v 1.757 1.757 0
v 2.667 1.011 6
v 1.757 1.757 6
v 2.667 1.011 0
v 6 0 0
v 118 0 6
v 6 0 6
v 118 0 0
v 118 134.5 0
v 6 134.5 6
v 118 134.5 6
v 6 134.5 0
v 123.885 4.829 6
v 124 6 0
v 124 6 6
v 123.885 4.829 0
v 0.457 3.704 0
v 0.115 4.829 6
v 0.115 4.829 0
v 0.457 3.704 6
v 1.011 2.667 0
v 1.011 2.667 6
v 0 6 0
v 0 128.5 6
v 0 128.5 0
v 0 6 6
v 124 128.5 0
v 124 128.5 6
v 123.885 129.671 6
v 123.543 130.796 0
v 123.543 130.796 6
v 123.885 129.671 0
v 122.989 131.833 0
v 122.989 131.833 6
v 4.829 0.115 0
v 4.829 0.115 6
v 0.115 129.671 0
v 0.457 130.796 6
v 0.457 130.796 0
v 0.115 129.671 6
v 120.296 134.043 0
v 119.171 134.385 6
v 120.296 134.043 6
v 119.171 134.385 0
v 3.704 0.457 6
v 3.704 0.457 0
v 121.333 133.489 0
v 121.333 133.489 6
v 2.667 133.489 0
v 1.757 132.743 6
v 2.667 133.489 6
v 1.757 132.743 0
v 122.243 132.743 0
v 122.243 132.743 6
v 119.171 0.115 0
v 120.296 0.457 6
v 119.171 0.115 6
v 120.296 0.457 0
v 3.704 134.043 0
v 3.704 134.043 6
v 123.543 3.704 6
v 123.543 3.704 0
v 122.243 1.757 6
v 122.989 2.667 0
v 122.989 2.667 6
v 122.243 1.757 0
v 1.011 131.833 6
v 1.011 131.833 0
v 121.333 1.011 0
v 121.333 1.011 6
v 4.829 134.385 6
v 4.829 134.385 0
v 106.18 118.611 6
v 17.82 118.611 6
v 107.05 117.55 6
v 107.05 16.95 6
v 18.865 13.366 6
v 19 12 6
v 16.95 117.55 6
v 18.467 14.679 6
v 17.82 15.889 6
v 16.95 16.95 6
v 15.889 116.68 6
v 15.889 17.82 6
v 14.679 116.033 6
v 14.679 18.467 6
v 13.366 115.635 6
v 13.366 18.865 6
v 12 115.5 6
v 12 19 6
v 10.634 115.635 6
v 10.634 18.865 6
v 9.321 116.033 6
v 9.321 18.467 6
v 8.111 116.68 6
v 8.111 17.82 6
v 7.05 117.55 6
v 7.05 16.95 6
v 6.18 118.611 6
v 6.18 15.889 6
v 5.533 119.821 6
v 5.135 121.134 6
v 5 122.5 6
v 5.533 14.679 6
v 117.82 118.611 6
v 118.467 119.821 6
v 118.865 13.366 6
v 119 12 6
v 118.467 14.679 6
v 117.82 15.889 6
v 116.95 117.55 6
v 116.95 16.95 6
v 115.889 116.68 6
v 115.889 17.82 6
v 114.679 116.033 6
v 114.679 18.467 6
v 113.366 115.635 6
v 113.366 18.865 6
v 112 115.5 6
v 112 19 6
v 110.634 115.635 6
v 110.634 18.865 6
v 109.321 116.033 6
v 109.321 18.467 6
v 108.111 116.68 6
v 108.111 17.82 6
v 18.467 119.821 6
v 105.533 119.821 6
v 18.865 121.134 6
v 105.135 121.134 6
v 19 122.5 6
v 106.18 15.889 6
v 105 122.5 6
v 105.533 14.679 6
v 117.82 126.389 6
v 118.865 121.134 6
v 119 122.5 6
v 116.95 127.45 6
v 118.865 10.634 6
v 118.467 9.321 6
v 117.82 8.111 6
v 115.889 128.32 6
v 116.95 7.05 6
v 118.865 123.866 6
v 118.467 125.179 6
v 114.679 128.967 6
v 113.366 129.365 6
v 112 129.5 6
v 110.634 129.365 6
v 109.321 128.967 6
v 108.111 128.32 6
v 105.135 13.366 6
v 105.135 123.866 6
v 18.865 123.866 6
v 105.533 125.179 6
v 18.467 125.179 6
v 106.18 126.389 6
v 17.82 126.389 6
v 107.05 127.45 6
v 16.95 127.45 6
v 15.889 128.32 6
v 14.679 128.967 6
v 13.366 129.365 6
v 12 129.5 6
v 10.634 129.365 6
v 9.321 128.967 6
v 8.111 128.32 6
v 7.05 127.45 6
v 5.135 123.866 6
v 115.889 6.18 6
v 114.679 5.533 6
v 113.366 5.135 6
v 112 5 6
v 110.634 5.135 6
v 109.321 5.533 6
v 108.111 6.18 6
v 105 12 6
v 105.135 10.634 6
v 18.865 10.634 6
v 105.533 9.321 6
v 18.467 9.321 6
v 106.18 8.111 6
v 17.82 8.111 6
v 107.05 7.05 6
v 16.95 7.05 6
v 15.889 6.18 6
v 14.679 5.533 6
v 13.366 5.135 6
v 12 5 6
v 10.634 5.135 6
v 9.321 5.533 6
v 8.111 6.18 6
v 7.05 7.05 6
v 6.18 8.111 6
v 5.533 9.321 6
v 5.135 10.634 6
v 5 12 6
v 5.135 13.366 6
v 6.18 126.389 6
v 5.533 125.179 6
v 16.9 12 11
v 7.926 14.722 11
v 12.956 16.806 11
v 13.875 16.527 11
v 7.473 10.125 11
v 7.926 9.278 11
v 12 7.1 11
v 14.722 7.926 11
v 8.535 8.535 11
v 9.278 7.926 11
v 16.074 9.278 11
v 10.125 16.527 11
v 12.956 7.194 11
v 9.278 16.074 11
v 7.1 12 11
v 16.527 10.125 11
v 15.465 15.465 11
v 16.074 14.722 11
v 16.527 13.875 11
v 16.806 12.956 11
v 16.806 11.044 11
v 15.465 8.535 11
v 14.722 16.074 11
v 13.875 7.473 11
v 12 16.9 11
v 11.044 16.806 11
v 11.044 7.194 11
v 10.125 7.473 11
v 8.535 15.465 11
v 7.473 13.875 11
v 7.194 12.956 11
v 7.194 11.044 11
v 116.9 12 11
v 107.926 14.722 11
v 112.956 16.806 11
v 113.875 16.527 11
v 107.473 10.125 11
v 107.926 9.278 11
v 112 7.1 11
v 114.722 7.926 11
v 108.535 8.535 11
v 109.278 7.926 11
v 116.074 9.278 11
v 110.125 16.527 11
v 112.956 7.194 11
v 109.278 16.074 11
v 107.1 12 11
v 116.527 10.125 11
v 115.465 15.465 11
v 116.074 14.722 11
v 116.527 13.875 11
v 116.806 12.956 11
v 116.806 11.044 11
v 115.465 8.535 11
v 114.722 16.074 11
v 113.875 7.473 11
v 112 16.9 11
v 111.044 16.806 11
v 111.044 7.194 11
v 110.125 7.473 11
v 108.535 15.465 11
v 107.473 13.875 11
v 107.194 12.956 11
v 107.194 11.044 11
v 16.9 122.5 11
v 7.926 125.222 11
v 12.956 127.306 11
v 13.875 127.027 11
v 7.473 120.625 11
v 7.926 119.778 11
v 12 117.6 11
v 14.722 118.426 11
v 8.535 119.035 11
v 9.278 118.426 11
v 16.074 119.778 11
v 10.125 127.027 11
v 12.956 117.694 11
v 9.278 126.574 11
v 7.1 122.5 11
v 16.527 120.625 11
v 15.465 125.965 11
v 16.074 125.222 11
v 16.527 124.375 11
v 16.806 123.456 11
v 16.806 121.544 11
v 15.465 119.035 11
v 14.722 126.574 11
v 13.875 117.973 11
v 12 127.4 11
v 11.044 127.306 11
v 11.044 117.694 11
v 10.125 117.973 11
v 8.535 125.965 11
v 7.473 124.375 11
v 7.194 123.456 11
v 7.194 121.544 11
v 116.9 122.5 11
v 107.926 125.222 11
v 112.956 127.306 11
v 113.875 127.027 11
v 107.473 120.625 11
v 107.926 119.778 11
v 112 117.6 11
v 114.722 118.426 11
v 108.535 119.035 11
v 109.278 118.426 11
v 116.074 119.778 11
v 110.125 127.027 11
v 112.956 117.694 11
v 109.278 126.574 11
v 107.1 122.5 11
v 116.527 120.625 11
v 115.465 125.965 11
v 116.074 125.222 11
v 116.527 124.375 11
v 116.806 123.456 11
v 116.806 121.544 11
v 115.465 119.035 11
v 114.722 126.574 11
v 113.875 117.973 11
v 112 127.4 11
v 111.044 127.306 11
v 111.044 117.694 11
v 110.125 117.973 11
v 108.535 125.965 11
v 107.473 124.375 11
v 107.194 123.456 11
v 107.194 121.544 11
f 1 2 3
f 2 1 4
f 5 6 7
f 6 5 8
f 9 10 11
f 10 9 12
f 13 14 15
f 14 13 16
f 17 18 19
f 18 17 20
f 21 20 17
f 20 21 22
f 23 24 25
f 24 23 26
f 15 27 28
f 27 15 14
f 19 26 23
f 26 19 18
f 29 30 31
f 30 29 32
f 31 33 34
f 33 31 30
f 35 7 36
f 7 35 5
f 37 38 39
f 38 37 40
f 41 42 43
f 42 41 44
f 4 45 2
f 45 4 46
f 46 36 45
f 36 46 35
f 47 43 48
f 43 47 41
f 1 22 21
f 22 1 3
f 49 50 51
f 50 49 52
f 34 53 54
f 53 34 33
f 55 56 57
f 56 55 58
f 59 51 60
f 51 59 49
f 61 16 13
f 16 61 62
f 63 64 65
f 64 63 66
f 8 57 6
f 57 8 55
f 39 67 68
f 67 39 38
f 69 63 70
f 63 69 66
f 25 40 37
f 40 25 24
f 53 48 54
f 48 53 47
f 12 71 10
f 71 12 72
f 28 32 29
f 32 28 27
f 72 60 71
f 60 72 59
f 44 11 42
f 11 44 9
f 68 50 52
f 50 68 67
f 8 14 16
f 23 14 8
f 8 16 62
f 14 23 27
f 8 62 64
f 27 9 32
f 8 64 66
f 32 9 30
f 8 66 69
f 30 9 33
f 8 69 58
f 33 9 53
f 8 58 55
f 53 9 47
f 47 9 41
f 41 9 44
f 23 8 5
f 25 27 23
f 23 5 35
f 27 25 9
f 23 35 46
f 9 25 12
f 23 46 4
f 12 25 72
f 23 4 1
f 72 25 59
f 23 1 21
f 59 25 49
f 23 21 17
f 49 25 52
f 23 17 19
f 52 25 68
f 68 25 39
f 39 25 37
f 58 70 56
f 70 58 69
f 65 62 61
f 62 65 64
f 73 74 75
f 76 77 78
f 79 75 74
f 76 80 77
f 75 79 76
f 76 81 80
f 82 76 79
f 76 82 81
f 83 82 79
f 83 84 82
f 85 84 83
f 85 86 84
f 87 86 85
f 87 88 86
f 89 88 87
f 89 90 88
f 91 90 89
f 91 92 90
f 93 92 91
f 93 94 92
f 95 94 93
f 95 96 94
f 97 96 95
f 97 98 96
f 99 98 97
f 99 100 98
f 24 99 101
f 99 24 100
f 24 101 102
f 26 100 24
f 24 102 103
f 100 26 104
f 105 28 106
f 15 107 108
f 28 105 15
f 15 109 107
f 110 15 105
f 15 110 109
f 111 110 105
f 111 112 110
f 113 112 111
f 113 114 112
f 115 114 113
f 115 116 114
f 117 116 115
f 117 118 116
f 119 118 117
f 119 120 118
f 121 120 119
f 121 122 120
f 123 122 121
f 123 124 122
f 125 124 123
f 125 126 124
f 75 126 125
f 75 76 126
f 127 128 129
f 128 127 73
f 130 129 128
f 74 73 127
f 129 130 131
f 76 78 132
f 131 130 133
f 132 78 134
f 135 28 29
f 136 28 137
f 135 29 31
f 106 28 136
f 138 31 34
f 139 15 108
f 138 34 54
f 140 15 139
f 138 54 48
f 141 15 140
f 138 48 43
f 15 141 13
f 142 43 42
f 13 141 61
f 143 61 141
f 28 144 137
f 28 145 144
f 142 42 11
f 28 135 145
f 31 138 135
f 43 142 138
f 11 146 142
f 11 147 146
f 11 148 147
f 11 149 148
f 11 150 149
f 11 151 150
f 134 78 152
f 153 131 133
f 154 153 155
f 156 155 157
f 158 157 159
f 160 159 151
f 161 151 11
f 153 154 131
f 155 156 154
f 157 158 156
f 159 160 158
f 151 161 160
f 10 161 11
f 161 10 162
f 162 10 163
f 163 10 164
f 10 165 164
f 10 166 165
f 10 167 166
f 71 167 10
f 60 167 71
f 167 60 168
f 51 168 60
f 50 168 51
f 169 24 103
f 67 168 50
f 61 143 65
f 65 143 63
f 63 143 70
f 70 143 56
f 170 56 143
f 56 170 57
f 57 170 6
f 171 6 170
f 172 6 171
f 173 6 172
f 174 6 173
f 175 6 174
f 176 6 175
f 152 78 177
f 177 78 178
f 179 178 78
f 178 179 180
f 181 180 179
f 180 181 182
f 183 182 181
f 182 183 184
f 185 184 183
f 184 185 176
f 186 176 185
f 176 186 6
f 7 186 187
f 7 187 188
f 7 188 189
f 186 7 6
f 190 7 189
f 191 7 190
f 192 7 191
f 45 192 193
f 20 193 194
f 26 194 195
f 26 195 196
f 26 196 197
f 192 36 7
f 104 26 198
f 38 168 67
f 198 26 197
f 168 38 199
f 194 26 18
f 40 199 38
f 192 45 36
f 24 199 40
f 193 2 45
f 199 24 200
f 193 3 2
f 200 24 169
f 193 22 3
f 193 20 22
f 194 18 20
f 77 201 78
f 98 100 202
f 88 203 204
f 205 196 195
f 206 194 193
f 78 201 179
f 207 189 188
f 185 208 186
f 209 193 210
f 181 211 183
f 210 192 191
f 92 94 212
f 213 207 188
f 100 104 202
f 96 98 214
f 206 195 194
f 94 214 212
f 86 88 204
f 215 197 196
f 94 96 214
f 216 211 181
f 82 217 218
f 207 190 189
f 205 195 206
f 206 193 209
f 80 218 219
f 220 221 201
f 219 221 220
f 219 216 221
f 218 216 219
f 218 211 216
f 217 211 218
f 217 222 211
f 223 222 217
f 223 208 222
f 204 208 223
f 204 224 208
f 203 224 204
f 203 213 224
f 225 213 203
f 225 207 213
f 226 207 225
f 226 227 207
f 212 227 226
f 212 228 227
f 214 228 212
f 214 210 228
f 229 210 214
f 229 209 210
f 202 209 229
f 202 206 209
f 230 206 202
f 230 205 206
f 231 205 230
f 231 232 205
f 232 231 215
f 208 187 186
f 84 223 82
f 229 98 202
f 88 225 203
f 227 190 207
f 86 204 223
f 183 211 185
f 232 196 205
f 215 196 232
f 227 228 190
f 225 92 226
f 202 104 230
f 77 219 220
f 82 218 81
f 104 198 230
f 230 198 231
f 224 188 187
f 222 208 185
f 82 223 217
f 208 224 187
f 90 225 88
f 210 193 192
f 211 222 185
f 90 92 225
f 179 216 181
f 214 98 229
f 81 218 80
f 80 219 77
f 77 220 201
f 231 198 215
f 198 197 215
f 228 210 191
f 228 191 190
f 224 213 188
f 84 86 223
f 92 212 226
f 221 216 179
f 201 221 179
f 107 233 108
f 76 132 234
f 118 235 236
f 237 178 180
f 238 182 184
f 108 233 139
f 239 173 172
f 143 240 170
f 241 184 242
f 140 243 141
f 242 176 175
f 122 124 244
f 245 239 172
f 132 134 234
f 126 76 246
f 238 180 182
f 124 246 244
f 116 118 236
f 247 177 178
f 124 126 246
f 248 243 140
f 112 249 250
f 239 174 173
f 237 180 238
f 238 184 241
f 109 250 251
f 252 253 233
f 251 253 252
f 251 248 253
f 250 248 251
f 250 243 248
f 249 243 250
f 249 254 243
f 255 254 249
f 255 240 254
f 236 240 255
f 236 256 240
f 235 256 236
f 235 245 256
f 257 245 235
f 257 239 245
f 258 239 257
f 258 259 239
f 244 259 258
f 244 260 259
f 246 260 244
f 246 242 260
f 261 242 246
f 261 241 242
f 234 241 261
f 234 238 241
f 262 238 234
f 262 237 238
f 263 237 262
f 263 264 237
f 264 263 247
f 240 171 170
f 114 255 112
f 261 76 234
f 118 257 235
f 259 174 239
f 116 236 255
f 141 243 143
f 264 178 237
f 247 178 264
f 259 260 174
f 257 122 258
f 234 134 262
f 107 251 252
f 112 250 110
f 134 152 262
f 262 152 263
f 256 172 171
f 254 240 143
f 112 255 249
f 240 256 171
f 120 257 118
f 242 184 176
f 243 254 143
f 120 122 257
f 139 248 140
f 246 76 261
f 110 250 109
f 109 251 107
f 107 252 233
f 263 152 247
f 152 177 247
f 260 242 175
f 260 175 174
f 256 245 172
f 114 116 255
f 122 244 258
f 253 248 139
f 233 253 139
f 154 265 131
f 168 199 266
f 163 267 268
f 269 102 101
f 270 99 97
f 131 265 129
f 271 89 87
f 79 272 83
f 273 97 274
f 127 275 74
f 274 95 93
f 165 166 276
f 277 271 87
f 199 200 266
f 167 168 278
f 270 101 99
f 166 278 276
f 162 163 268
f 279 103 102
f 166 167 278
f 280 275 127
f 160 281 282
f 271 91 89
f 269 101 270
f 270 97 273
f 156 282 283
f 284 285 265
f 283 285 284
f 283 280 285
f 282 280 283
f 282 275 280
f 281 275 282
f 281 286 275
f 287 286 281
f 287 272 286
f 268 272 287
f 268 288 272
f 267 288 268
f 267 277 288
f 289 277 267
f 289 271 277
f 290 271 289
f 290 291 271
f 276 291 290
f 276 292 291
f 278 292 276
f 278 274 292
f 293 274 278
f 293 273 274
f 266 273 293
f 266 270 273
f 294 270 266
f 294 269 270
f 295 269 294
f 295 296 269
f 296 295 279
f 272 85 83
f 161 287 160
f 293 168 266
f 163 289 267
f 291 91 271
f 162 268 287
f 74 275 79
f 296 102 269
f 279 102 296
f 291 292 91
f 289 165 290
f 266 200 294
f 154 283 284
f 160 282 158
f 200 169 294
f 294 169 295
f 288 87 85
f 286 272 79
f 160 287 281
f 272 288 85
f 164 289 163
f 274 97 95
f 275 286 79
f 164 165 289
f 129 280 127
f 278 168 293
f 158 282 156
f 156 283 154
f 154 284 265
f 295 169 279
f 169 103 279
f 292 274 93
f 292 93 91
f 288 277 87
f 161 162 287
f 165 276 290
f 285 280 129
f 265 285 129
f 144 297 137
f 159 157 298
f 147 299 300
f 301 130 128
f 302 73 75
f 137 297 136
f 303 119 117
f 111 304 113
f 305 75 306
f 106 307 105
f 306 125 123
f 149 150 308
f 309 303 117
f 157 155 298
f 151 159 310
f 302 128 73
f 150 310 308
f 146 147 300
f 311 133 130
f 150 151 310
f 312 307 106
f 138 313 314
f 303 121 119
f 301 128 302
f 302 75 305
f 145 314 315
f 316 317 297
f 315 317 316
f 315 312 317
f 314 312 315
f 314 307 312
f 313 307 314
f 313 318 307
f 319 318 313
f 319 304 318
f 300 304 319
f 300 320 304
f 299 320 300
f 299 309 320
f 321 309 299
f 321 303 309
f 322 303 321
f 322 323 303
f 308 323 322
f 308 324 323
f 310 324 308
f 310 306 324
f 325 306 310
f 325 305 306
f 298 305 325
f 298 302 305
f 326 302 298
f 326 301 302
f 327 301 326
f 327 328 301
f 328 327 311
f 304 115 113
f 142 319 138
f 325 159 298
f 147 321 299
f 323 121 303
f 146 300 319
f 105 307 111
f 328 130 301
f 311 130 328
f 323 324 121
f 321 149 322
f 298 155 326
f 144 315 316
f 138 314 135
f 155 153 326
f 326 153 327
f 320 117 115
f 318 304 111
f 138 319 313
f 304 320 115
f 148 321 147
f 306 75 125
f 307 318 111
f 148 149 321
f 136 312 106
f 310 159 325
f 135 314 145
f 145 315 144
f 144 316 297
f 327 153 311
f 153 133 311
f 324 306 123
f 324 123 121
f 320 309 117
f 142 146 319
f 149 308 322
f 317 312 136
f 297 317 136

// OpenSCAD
// Sonos Era 100 Isolation Pad
// Material: PETG recommended
// Speaker footprint: 120mm W x 130.5mm D
// Pad adds 2mm margin on each side for easy placement

// --- Parameters ---
pad_width   = 124;   // mm (120 + 2mm margin each side)
pad_depth   = 134.5; // mm (130.5 + 2mm margin each side)
pad_height  = 6;     // mm base thickness

// Nub (isolation foot) parameters
nub_diameter  = 14;  // mm
nub_height    = 5;   // mm
nub_inset     = 12;  // mm from each corner (center of nub)
nub_fn        = 32;  // smoothness

// Corner radius for aesthetics
corner_radius = 6;   // mm

// --- Main Body (rounded rectangle base) ---
module rounded_rect(w, d, h, r) {
    hull() {
        translate([ r,  r, 0]) cylinder(r=r, h=h, $fn=nub_fn);
        translate([w-r, r, 0]) cylinder(r=r, h=h, $fn=nub_fn);
        translate([ r, d-r, 0]) cylinder(r=r, h=h, $fn=nub_fn);
        translate([w-r, d-r, 0]) cylinder(r=r, h=h, $fn=nub_fn);
    }
}

// --- Nub (vibration isolation foot) ---
// Tapered cylinder for better grip and isolation
module nub() {
    cylinder(d1=nub_diameter, d2=nub_diameter*0.7, h=nub_height, $fn=nub_fn);
}

// --- Assemble ---
union() {
    // Base pad
    rounded_rect(pad_width, pad_depth, pad_height, corner_radius);

    // Four corner nubs on the bottom (printed upside down, so they appear on top in model)
    // When printing: orient so nubs face DOWN onto the shelf surface
    translate([nub_inset,            nub_inset,            pad_height]) nub();
    translate([pad_width - nub_inset, nub_inset,            pad_height]) nub();
    translate([nub_inset,            pad_depth - nub_inset, pad_height]) nub();
    translate([pad_width - nub_inset, pad_depth - nub_inset, pad_height]) nub();
}

// --- PRINT NOTES (read before slicing) ---
// 1. Print UPSIDE DOWN (nubs facing the build plate) so nubs face DOWN in use
// 2. PETG settings: 240°C nozzle, 70-80°C bed, 3 walls, 20-30% infill
// 3. No supports needed
// 4. Print 2 copies — one per speaker
// 5. The nubs contact the shelf; the flat top supports the speaker
// 6. Optional: press small rubber O-rings or silicone bumper stickers
//    onto the nub tips for extra damping
